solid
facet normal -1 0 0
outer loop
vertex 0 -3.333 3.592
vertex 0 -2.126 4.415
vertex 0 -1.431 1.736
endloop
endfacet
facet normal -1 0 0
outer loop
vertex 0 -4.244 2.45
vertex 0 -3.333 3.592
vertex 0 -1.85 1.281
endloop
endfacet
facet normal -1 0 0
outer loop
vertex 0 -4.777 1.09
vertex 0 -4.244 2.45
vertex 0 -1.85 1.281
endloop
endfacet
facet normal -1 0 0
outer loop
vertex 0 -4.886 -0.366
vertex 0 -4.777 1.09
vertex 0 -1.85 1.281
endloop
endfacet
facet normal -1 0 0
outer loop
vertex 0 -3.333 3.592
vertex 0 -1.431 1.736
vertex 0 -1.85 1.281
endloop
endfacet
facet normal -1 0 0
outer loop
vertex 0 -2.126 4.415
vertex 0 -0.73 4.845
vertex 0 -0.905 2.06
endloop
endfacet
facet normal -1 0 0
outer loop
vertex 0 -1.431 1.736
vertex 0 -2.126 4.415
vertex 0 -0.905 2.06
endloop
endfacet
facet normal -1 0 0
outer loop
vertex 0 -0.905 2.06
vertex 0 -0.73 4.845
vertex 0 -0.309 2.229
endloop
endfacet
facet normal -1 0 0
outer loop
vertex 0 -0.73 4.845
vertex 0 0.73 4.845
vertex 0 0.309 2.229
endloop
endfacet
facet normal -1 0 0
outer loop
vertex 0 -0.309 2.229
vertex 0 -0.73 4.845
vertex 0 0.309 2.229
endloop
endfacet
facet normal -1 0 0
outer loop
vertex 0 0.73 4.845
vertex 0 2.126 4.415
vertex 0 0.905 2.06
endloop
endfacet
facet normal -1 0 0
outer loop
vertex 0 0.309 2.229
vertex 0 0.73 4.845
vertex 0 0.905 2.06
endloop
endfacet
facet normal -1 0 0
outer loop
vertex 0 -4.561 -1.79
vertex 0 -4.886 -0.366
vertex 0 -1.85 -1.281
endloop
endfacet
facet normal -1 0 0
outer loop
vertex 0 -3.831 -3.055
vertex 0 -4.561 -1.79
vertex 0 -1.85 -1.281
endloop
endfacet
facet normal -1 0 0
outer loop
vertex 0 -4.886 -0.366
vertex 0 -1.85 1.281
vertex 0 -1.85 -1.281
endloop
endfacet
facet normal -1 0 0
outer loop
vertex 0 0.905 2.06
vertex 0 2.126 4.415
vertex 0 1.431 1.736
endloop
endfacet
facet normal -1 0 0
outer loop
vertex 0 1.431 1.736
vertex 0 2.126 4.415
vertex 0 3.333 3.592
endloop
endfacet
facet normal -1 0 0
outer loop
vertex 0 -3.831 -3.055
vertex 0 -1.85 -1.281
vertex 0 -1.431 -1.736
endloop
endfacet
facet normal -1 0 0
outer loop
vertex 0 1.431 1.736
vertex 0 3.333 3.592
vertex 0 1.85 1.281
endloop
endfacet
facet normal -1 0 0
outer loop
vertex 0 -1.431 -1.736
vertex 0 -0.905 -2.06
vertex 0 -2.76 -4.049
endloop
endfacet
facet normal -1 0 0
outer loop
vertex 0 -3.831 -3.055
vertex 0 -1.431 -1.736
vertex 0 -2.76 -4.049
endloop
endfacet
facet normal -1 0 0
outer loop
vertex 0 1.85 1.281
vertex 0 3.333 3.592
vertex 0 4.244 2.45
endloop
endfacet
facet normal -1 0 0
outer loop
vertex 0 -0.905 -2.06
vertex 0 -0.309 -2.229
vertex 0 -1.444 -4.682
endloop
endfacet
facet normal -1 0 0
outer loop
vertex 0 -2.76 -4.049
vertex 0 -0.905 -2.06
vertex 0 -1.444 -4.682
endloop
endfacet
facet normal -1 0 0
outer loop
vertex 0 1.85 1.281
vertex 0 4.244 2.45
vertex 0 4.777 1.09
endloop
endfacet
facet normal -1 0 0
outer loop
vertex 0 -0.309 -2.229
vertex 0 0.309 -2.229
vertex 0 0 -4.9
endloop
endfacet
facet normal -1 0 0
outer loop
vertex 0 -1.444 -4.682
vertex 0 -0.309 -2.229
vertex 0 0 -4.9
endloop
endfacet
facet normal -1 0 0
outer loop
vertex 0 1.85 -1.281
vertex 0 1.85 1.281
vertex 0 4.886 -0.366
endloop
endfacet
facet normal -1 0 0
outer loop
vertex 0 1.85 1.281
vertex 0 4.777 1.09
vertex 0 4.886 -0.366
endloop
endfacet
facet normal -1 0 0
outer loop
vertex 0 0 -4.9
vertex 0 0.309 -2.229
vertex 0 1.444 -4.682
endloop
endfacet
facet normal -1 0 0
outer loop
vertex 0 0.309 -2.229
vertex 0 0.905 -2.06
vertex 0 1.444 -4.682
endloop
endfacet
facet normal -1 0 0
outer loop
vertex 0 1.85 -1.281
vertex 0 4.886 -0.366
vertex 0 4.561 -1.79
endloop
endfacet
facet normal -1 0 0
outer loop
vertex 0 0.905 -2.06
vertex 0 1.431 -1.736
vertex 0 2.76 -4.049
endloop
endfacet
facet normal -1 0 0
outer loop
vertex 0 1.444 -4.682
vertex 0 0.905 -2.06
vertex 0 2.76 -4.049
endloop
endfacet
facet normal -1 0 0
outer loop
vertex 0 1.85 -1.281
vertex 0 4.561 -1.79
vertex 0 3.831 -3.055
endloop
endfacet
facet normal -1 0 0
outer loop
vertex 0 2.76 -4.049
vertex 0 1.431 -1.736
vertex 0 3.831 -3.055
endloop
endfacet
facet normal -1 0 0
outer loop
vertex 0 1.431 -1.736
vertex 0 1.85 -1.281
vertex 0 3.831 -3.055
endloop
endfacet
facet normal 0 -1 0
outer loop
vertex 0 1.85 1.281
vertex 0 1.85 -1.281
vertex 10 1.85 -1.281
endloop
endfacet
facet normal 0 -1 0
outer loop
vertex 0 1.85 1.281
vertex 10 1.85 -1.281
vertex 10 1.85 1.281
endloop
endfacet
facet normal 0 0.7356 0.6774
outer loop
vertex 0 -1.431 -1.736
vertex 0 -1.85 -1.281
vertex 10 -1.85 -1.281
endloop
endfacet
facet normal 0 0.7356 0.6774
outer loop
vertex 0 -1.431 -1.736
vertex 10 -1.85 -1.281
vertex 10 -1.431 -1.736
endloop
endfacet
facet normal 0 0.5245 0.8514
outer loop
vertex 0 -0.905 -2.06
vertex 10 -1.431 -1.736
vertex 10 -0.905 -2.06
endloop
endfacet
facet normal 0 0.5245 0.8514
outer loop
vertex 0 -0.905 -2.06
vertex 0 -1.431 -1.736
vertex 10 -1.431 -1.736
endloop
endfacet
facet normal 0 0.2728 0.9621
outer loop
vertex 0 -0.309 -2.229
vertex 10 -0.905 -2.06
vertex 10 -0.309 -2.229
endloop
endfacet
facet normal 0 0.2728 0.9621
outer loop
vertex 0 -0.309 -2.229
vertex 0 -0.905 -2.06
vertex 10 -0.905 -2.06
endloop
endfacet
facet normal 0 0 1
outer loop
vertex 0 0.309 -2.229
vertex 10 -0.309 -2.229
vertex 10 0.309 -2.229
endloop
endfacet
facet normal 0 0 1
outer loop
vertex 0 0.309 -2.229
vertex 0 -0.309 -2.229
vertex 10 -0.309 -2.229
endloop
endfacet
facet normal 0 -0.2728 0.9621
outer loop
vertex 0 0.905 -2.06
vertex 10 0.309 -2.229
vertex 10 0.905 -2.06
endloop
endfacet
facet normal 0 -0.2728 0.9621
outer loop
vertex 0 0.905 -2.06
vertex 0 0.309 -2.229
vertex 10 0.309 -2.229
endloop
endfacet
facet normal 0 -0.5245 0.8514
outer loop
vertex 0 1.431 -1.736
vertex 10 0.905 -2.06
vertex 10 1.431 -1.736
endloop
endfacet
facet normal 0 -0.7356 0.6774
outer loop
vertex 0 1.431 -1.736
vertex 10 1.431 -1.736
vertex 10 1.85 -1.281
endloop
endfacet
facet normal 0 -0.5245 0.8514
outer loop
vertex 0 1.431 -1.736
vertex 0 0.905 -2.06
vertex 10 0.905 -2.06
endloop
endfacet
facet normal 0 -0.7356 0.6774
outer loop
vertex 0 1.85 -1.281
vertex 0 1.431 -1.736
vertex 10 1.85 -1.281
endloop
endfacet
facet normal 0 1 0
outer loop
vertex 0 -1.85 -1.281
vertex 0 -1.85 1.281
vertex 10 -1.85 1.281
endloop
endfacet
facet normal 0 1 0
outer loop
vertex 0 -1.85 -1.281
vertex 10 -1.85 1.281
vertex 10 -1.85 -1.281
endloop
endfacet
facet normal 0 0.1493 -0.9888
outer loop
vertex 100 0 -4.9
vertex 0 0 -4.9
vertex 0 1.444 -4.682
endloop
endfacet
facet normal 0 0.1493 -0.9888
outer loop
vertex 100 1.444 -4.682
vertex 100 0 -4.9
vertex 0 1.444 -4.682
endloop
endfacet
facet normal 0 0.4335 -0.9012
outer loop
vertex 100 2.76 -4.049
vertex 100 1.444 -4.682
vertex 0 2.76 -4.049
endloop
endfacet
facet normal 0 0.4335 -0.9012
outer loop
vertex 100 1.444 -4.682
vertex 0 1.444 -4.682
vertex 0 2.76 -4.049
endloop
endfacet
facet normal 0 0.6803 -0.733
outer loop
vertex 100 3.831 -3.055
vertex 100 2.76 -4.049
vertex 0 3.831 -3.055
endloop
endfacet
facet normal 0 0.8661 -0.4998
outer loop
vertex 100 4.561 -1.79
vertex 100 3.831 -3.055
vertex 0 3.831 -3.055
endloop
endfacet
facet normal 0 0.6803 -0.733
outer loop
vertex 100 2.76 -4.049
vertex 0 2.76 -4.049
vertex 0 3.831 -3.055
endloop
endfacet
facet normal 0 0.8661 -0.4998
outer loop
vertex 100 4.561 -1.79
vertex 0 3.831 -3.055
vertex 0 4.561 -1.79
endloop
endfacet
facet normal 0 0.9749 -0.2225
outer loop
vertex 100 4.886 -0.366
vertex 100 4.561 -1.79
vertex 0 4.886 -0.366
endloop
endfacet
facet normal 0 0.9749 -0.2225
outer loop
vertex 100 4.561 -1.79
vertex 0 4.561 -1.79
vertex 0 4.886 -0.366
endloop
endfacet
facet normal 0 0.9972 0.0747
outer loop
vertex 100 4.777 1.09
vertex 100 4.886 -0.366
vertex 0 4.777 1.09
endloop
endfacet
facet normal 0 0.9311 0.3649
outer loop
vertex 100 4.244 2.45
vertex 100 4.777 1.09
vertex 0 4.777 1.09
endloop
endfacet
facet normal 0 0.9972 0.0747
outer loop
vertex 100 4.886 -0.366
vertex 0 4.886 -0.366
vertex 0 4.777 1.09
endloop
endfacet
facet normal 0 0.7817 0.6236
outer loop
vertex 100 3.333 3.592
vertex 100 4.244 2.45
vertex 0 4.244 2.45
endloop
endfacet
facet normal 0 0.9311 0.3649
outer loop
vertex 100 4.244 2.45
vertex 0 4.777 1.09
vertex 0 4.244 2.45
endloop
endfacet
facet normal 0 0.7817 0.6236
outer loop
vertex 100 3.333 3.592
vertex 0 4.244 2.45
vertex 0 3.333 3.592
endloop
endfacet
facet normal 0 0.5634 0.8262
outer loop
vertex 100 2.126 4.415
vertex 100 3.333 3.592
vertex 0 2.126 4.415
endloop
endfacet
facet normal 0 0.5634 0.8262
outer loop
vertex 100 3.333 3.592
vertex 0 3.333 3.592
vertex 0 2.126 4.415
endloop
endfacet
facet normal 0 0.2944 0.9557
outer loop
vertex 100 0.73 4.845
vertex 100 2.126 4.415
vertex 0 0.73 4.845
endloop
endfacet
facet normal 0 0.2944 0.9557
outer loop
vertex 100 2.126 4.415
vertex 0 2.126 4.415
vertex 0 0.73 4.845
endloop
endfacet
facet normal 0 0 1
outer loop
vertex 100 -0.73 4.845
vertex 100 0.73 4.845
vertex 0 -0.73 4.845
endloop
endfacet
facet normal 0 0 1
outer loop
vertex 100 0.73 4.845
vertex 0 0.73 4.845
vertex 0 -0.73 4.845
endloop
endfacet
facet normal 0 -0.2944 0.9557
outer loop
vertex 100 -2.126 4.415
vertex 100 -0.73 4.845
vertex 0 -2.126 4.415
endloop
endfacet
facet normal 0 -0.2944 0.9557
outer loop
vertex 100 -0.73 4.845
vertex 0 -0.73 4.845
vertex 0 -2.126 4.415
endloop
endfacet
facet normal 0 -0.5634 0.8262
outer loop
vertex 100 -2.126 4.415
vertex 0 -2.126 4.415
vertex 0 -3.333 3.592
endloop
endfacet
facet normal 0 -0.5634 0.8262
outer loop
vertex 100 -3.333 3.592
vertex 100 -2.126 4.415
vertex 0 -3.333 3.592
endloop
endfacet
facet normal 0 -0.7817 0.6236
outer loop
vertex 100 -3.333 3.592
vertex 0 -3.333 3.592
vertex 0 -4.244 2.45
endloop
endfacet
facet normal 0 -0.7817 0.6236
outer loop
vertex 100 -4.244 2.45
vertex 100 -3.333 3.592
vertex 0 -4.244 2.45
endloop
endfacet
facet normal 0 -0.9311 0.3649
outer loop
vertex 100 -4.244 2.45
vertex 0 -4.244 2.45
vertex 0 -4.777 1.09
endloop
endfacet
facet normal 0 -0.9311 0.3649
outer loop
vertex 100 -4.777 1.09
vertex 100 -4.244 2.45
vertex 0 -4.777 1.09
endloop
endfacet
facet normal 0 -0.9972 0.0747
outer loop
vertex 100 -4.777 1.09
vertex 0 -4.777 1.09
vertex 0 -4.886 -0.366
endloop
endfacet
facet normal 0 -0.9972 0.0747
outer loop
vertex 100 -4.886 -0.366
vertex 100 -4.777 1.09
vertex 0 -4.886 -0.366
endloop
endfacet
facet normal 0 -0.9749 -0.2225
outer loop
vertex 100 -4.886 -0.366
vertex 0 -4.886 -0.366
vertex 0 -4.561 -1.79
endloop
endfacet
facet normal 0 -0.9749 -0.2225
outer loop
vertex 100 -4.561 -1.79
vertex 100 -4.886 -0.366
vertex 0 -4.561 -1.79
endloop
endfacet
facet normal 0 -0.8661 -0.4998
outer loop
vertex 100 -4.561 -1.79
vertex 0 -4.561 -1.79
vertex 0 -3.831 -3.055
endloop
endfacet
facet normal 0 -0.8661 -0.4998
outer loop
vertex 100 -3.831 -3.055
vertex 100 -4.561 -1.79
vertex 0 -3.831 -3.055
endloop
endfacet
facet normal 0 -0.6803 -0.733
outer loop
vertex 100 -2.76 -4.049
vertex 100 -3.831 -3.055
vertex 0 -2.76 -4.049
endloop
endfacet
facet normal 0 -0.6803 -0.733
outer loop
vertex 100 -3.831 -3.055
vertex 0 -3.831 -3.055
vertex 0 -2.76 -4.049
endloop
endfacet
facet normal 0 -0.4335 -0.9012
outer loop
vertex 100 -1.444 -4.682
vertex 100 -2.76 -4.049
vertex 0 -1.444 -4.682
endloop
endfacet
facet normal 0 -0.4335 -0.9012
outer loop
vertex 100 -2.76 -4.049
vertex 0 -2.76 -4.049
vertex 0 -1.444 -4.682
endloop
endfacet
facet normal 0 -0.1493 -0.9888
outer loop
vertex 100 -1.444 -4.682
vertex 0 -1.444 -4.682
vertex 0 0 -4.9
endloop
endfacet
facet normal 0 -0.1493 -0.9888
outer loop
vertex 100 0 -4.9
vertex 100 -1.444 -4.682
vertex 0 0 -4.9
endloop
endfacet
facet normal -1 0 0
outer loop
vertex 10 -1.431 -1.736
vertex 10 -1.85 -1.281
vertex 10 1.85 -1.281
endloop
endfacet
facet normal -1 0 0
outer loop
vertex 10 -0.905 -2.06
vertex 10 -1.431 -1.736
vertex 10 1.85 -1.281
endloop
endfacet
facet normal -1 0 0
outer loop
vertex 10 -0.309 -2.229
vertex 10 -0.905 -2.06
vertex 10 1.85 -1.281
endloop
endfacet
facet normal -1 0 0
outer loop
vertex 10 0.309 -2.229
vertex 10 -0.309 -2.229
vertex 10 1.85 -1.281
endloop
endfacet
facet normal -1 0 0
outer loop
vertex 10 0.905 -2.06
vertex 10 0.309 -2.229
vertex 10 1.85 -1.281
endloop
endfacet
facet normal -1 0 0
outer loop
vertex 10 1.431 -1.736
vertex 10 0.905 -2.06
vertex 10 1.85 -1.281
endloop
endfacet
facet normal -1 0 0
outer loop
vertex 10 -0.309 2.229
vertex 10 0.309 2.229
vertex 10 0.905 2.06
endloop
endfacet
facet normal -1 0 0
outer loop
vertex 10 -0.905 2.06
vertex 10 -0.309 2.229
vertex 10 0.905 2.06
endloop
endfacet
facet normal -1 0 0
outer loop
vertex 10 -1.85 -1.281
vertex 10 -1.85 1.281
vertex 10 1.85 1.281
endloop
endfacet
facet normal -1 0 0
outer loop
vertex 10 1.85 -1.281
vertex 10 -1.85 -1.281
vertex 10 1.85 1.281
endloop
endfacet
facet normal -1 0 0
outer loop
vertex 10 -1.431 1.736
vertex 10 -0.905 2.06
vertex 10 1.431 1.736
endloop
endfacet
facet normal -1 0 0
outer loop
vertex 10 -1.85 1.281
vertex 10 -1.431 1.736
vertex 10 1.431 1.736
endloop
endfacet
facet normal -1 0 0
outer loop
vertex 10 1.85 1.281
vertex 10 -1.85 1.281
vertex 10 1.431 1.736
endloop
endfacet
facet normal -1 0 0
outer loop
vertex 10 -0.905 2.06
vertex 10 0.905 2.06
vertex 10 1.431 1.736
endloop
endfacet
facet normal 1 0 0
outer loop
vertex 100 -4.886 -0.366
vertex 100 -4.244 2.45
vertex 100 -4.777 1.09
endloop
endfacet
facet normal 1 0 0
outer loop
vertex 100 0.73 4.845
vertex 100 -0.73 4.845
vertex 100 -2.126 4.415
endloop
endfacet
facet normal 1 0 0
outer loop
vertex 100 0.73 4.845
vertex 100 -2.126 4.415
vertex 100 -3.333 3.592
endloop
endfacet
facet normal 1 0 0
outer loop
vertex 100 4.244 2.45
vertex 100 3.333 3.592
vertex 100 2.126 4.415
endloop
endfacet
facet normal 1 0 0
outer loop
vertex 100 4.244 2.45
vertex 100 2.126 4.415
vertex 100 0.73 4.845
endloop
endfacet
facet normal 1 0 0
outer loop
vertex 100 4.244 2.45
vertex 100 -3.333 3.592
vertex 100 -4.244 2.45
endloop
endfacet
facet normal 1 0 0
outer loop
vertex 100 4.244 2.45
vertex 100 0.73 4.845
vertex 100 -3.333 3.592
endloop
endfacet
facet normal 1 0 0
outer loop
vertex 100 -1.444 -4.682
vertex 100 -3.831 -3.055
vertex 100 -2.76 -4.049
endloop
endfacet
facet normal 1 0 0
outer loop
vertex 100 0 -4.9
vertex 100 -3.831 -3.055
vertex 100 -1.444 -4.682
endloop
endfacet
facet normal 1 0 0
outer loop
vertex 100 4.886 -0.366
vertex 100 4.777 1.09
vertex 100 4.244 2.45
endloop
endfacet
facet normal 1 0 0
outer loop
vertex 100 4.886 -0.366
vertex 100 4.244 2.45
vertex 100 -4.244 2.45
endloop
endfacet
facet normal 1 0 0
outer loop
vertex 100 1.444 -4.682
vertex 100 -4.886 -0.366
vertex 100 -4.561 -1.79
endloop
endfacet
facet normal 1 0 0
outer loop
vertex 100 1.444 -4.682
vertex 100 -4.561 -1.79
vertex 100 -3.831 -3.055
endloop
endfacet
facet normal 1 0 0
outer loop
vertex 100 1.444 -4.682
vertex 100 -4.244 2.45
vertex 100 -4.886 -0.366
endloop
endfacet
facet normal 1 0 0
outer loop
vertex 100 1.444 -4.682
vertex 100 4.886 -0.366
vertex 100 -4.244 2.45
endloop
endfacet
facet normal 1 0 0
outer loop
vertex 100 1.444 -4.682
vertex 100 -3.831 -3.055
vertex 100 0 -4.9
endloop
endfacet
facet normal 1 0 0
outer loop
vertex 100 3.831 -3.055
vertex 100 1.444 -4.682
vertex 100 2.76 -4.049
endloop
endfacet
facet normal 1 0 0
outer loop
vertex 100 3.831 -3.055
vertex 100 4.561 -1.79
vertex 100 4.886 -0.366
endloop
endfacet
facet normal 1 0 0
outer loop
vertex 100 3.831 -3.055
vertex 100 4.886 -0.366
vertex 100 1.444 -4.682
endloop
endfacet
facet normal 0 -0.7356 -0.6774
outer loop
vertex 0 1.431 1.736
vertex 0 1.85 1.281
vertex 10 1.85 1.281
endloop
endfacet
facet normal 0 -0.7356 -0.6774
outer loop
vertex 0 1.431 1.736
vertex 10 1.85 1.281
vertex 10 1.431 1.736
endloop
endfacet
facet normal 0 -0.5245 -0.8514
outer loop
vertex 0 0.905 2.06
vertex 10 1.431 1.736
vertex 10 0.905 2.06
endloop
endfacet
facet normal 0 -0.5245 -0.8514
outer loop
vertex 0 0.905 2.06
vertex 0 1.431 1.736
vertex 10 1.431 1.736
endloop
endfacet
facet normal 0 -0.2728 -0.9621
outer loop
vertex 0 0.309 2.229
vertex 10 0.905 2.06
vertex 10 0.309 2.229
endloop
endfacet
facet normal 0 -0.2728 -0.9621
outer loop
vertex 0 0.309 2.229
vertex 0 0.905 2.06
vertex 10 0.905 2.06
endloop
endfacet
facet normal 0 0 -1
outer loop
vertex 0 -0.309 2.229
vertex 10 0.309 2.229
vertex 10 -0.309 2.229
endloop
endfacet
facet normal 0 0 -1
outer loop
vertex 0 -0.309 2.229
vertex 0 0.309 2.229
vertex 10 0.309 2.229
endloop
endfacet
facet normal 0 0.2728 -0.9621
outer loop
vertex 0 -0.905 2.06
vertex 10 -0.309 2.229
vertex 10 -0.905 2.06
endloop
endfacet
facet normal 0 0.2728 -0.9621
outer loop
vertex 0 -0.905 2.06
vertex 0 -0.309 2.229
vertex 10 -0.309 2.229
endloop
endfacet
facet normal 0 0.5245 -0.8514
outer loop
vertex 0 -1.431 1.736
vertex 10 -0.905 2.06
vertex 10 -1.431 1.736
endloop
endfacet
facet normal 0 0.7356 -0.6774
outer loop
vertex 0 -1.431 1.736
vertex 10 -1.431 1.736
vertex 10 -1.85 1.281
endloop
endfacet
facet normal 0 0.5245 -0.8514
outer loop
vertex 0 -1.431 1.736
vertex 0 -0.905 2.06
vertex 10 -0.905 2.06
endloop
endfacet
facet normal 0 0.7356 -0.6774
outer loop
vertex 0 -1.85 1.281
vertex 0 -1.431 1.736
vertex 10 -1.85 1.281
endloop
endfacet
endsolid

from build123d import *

# Parameters (mm, degrees)
SKETCH1_R           = 4.9
BOSS_EXTRUDE1_DEPTH = 100
CUT_EXTRUDE1_DEPTH  = 10


with BuildPart() as part:
    # Sketch1 → Boss-Extrude1 (new body)
    with BuildSketch(Plane.YZ):
        with Locations(Location((0, 0, 0), (0, 0, 270))):
            Circle(SKETCH1_R)
    extrude(amount=BOSS_EXTRUDE1_DEPTH)

    # Sketch2 → Cut-Extrude1 (cut)
    with BuildSketch(Plane(origin=(0, 0, 0), x_dir=(0, -1, 0), z_dir=(-1, 0, 0))):
        with BuildLine():
            Line((-1.85, -1.280624847), (-1.85, 1.280624847))
            ThreePointArc((-1.85, 1.280624847), (0, 2.25), (1.85, 1.280624847))
            Line((1.85, 1.280624847), (1.85, -1.280624847))
            ThreePointArc((1.85, -1.280624847), (0, -2.25), (-1.85, -1.280624847))
        make_face()
    extrude(amount=-CUT_EXTRUDE1_DEPTH, mode=Mode.SUBTRACT)


solid = part.part
